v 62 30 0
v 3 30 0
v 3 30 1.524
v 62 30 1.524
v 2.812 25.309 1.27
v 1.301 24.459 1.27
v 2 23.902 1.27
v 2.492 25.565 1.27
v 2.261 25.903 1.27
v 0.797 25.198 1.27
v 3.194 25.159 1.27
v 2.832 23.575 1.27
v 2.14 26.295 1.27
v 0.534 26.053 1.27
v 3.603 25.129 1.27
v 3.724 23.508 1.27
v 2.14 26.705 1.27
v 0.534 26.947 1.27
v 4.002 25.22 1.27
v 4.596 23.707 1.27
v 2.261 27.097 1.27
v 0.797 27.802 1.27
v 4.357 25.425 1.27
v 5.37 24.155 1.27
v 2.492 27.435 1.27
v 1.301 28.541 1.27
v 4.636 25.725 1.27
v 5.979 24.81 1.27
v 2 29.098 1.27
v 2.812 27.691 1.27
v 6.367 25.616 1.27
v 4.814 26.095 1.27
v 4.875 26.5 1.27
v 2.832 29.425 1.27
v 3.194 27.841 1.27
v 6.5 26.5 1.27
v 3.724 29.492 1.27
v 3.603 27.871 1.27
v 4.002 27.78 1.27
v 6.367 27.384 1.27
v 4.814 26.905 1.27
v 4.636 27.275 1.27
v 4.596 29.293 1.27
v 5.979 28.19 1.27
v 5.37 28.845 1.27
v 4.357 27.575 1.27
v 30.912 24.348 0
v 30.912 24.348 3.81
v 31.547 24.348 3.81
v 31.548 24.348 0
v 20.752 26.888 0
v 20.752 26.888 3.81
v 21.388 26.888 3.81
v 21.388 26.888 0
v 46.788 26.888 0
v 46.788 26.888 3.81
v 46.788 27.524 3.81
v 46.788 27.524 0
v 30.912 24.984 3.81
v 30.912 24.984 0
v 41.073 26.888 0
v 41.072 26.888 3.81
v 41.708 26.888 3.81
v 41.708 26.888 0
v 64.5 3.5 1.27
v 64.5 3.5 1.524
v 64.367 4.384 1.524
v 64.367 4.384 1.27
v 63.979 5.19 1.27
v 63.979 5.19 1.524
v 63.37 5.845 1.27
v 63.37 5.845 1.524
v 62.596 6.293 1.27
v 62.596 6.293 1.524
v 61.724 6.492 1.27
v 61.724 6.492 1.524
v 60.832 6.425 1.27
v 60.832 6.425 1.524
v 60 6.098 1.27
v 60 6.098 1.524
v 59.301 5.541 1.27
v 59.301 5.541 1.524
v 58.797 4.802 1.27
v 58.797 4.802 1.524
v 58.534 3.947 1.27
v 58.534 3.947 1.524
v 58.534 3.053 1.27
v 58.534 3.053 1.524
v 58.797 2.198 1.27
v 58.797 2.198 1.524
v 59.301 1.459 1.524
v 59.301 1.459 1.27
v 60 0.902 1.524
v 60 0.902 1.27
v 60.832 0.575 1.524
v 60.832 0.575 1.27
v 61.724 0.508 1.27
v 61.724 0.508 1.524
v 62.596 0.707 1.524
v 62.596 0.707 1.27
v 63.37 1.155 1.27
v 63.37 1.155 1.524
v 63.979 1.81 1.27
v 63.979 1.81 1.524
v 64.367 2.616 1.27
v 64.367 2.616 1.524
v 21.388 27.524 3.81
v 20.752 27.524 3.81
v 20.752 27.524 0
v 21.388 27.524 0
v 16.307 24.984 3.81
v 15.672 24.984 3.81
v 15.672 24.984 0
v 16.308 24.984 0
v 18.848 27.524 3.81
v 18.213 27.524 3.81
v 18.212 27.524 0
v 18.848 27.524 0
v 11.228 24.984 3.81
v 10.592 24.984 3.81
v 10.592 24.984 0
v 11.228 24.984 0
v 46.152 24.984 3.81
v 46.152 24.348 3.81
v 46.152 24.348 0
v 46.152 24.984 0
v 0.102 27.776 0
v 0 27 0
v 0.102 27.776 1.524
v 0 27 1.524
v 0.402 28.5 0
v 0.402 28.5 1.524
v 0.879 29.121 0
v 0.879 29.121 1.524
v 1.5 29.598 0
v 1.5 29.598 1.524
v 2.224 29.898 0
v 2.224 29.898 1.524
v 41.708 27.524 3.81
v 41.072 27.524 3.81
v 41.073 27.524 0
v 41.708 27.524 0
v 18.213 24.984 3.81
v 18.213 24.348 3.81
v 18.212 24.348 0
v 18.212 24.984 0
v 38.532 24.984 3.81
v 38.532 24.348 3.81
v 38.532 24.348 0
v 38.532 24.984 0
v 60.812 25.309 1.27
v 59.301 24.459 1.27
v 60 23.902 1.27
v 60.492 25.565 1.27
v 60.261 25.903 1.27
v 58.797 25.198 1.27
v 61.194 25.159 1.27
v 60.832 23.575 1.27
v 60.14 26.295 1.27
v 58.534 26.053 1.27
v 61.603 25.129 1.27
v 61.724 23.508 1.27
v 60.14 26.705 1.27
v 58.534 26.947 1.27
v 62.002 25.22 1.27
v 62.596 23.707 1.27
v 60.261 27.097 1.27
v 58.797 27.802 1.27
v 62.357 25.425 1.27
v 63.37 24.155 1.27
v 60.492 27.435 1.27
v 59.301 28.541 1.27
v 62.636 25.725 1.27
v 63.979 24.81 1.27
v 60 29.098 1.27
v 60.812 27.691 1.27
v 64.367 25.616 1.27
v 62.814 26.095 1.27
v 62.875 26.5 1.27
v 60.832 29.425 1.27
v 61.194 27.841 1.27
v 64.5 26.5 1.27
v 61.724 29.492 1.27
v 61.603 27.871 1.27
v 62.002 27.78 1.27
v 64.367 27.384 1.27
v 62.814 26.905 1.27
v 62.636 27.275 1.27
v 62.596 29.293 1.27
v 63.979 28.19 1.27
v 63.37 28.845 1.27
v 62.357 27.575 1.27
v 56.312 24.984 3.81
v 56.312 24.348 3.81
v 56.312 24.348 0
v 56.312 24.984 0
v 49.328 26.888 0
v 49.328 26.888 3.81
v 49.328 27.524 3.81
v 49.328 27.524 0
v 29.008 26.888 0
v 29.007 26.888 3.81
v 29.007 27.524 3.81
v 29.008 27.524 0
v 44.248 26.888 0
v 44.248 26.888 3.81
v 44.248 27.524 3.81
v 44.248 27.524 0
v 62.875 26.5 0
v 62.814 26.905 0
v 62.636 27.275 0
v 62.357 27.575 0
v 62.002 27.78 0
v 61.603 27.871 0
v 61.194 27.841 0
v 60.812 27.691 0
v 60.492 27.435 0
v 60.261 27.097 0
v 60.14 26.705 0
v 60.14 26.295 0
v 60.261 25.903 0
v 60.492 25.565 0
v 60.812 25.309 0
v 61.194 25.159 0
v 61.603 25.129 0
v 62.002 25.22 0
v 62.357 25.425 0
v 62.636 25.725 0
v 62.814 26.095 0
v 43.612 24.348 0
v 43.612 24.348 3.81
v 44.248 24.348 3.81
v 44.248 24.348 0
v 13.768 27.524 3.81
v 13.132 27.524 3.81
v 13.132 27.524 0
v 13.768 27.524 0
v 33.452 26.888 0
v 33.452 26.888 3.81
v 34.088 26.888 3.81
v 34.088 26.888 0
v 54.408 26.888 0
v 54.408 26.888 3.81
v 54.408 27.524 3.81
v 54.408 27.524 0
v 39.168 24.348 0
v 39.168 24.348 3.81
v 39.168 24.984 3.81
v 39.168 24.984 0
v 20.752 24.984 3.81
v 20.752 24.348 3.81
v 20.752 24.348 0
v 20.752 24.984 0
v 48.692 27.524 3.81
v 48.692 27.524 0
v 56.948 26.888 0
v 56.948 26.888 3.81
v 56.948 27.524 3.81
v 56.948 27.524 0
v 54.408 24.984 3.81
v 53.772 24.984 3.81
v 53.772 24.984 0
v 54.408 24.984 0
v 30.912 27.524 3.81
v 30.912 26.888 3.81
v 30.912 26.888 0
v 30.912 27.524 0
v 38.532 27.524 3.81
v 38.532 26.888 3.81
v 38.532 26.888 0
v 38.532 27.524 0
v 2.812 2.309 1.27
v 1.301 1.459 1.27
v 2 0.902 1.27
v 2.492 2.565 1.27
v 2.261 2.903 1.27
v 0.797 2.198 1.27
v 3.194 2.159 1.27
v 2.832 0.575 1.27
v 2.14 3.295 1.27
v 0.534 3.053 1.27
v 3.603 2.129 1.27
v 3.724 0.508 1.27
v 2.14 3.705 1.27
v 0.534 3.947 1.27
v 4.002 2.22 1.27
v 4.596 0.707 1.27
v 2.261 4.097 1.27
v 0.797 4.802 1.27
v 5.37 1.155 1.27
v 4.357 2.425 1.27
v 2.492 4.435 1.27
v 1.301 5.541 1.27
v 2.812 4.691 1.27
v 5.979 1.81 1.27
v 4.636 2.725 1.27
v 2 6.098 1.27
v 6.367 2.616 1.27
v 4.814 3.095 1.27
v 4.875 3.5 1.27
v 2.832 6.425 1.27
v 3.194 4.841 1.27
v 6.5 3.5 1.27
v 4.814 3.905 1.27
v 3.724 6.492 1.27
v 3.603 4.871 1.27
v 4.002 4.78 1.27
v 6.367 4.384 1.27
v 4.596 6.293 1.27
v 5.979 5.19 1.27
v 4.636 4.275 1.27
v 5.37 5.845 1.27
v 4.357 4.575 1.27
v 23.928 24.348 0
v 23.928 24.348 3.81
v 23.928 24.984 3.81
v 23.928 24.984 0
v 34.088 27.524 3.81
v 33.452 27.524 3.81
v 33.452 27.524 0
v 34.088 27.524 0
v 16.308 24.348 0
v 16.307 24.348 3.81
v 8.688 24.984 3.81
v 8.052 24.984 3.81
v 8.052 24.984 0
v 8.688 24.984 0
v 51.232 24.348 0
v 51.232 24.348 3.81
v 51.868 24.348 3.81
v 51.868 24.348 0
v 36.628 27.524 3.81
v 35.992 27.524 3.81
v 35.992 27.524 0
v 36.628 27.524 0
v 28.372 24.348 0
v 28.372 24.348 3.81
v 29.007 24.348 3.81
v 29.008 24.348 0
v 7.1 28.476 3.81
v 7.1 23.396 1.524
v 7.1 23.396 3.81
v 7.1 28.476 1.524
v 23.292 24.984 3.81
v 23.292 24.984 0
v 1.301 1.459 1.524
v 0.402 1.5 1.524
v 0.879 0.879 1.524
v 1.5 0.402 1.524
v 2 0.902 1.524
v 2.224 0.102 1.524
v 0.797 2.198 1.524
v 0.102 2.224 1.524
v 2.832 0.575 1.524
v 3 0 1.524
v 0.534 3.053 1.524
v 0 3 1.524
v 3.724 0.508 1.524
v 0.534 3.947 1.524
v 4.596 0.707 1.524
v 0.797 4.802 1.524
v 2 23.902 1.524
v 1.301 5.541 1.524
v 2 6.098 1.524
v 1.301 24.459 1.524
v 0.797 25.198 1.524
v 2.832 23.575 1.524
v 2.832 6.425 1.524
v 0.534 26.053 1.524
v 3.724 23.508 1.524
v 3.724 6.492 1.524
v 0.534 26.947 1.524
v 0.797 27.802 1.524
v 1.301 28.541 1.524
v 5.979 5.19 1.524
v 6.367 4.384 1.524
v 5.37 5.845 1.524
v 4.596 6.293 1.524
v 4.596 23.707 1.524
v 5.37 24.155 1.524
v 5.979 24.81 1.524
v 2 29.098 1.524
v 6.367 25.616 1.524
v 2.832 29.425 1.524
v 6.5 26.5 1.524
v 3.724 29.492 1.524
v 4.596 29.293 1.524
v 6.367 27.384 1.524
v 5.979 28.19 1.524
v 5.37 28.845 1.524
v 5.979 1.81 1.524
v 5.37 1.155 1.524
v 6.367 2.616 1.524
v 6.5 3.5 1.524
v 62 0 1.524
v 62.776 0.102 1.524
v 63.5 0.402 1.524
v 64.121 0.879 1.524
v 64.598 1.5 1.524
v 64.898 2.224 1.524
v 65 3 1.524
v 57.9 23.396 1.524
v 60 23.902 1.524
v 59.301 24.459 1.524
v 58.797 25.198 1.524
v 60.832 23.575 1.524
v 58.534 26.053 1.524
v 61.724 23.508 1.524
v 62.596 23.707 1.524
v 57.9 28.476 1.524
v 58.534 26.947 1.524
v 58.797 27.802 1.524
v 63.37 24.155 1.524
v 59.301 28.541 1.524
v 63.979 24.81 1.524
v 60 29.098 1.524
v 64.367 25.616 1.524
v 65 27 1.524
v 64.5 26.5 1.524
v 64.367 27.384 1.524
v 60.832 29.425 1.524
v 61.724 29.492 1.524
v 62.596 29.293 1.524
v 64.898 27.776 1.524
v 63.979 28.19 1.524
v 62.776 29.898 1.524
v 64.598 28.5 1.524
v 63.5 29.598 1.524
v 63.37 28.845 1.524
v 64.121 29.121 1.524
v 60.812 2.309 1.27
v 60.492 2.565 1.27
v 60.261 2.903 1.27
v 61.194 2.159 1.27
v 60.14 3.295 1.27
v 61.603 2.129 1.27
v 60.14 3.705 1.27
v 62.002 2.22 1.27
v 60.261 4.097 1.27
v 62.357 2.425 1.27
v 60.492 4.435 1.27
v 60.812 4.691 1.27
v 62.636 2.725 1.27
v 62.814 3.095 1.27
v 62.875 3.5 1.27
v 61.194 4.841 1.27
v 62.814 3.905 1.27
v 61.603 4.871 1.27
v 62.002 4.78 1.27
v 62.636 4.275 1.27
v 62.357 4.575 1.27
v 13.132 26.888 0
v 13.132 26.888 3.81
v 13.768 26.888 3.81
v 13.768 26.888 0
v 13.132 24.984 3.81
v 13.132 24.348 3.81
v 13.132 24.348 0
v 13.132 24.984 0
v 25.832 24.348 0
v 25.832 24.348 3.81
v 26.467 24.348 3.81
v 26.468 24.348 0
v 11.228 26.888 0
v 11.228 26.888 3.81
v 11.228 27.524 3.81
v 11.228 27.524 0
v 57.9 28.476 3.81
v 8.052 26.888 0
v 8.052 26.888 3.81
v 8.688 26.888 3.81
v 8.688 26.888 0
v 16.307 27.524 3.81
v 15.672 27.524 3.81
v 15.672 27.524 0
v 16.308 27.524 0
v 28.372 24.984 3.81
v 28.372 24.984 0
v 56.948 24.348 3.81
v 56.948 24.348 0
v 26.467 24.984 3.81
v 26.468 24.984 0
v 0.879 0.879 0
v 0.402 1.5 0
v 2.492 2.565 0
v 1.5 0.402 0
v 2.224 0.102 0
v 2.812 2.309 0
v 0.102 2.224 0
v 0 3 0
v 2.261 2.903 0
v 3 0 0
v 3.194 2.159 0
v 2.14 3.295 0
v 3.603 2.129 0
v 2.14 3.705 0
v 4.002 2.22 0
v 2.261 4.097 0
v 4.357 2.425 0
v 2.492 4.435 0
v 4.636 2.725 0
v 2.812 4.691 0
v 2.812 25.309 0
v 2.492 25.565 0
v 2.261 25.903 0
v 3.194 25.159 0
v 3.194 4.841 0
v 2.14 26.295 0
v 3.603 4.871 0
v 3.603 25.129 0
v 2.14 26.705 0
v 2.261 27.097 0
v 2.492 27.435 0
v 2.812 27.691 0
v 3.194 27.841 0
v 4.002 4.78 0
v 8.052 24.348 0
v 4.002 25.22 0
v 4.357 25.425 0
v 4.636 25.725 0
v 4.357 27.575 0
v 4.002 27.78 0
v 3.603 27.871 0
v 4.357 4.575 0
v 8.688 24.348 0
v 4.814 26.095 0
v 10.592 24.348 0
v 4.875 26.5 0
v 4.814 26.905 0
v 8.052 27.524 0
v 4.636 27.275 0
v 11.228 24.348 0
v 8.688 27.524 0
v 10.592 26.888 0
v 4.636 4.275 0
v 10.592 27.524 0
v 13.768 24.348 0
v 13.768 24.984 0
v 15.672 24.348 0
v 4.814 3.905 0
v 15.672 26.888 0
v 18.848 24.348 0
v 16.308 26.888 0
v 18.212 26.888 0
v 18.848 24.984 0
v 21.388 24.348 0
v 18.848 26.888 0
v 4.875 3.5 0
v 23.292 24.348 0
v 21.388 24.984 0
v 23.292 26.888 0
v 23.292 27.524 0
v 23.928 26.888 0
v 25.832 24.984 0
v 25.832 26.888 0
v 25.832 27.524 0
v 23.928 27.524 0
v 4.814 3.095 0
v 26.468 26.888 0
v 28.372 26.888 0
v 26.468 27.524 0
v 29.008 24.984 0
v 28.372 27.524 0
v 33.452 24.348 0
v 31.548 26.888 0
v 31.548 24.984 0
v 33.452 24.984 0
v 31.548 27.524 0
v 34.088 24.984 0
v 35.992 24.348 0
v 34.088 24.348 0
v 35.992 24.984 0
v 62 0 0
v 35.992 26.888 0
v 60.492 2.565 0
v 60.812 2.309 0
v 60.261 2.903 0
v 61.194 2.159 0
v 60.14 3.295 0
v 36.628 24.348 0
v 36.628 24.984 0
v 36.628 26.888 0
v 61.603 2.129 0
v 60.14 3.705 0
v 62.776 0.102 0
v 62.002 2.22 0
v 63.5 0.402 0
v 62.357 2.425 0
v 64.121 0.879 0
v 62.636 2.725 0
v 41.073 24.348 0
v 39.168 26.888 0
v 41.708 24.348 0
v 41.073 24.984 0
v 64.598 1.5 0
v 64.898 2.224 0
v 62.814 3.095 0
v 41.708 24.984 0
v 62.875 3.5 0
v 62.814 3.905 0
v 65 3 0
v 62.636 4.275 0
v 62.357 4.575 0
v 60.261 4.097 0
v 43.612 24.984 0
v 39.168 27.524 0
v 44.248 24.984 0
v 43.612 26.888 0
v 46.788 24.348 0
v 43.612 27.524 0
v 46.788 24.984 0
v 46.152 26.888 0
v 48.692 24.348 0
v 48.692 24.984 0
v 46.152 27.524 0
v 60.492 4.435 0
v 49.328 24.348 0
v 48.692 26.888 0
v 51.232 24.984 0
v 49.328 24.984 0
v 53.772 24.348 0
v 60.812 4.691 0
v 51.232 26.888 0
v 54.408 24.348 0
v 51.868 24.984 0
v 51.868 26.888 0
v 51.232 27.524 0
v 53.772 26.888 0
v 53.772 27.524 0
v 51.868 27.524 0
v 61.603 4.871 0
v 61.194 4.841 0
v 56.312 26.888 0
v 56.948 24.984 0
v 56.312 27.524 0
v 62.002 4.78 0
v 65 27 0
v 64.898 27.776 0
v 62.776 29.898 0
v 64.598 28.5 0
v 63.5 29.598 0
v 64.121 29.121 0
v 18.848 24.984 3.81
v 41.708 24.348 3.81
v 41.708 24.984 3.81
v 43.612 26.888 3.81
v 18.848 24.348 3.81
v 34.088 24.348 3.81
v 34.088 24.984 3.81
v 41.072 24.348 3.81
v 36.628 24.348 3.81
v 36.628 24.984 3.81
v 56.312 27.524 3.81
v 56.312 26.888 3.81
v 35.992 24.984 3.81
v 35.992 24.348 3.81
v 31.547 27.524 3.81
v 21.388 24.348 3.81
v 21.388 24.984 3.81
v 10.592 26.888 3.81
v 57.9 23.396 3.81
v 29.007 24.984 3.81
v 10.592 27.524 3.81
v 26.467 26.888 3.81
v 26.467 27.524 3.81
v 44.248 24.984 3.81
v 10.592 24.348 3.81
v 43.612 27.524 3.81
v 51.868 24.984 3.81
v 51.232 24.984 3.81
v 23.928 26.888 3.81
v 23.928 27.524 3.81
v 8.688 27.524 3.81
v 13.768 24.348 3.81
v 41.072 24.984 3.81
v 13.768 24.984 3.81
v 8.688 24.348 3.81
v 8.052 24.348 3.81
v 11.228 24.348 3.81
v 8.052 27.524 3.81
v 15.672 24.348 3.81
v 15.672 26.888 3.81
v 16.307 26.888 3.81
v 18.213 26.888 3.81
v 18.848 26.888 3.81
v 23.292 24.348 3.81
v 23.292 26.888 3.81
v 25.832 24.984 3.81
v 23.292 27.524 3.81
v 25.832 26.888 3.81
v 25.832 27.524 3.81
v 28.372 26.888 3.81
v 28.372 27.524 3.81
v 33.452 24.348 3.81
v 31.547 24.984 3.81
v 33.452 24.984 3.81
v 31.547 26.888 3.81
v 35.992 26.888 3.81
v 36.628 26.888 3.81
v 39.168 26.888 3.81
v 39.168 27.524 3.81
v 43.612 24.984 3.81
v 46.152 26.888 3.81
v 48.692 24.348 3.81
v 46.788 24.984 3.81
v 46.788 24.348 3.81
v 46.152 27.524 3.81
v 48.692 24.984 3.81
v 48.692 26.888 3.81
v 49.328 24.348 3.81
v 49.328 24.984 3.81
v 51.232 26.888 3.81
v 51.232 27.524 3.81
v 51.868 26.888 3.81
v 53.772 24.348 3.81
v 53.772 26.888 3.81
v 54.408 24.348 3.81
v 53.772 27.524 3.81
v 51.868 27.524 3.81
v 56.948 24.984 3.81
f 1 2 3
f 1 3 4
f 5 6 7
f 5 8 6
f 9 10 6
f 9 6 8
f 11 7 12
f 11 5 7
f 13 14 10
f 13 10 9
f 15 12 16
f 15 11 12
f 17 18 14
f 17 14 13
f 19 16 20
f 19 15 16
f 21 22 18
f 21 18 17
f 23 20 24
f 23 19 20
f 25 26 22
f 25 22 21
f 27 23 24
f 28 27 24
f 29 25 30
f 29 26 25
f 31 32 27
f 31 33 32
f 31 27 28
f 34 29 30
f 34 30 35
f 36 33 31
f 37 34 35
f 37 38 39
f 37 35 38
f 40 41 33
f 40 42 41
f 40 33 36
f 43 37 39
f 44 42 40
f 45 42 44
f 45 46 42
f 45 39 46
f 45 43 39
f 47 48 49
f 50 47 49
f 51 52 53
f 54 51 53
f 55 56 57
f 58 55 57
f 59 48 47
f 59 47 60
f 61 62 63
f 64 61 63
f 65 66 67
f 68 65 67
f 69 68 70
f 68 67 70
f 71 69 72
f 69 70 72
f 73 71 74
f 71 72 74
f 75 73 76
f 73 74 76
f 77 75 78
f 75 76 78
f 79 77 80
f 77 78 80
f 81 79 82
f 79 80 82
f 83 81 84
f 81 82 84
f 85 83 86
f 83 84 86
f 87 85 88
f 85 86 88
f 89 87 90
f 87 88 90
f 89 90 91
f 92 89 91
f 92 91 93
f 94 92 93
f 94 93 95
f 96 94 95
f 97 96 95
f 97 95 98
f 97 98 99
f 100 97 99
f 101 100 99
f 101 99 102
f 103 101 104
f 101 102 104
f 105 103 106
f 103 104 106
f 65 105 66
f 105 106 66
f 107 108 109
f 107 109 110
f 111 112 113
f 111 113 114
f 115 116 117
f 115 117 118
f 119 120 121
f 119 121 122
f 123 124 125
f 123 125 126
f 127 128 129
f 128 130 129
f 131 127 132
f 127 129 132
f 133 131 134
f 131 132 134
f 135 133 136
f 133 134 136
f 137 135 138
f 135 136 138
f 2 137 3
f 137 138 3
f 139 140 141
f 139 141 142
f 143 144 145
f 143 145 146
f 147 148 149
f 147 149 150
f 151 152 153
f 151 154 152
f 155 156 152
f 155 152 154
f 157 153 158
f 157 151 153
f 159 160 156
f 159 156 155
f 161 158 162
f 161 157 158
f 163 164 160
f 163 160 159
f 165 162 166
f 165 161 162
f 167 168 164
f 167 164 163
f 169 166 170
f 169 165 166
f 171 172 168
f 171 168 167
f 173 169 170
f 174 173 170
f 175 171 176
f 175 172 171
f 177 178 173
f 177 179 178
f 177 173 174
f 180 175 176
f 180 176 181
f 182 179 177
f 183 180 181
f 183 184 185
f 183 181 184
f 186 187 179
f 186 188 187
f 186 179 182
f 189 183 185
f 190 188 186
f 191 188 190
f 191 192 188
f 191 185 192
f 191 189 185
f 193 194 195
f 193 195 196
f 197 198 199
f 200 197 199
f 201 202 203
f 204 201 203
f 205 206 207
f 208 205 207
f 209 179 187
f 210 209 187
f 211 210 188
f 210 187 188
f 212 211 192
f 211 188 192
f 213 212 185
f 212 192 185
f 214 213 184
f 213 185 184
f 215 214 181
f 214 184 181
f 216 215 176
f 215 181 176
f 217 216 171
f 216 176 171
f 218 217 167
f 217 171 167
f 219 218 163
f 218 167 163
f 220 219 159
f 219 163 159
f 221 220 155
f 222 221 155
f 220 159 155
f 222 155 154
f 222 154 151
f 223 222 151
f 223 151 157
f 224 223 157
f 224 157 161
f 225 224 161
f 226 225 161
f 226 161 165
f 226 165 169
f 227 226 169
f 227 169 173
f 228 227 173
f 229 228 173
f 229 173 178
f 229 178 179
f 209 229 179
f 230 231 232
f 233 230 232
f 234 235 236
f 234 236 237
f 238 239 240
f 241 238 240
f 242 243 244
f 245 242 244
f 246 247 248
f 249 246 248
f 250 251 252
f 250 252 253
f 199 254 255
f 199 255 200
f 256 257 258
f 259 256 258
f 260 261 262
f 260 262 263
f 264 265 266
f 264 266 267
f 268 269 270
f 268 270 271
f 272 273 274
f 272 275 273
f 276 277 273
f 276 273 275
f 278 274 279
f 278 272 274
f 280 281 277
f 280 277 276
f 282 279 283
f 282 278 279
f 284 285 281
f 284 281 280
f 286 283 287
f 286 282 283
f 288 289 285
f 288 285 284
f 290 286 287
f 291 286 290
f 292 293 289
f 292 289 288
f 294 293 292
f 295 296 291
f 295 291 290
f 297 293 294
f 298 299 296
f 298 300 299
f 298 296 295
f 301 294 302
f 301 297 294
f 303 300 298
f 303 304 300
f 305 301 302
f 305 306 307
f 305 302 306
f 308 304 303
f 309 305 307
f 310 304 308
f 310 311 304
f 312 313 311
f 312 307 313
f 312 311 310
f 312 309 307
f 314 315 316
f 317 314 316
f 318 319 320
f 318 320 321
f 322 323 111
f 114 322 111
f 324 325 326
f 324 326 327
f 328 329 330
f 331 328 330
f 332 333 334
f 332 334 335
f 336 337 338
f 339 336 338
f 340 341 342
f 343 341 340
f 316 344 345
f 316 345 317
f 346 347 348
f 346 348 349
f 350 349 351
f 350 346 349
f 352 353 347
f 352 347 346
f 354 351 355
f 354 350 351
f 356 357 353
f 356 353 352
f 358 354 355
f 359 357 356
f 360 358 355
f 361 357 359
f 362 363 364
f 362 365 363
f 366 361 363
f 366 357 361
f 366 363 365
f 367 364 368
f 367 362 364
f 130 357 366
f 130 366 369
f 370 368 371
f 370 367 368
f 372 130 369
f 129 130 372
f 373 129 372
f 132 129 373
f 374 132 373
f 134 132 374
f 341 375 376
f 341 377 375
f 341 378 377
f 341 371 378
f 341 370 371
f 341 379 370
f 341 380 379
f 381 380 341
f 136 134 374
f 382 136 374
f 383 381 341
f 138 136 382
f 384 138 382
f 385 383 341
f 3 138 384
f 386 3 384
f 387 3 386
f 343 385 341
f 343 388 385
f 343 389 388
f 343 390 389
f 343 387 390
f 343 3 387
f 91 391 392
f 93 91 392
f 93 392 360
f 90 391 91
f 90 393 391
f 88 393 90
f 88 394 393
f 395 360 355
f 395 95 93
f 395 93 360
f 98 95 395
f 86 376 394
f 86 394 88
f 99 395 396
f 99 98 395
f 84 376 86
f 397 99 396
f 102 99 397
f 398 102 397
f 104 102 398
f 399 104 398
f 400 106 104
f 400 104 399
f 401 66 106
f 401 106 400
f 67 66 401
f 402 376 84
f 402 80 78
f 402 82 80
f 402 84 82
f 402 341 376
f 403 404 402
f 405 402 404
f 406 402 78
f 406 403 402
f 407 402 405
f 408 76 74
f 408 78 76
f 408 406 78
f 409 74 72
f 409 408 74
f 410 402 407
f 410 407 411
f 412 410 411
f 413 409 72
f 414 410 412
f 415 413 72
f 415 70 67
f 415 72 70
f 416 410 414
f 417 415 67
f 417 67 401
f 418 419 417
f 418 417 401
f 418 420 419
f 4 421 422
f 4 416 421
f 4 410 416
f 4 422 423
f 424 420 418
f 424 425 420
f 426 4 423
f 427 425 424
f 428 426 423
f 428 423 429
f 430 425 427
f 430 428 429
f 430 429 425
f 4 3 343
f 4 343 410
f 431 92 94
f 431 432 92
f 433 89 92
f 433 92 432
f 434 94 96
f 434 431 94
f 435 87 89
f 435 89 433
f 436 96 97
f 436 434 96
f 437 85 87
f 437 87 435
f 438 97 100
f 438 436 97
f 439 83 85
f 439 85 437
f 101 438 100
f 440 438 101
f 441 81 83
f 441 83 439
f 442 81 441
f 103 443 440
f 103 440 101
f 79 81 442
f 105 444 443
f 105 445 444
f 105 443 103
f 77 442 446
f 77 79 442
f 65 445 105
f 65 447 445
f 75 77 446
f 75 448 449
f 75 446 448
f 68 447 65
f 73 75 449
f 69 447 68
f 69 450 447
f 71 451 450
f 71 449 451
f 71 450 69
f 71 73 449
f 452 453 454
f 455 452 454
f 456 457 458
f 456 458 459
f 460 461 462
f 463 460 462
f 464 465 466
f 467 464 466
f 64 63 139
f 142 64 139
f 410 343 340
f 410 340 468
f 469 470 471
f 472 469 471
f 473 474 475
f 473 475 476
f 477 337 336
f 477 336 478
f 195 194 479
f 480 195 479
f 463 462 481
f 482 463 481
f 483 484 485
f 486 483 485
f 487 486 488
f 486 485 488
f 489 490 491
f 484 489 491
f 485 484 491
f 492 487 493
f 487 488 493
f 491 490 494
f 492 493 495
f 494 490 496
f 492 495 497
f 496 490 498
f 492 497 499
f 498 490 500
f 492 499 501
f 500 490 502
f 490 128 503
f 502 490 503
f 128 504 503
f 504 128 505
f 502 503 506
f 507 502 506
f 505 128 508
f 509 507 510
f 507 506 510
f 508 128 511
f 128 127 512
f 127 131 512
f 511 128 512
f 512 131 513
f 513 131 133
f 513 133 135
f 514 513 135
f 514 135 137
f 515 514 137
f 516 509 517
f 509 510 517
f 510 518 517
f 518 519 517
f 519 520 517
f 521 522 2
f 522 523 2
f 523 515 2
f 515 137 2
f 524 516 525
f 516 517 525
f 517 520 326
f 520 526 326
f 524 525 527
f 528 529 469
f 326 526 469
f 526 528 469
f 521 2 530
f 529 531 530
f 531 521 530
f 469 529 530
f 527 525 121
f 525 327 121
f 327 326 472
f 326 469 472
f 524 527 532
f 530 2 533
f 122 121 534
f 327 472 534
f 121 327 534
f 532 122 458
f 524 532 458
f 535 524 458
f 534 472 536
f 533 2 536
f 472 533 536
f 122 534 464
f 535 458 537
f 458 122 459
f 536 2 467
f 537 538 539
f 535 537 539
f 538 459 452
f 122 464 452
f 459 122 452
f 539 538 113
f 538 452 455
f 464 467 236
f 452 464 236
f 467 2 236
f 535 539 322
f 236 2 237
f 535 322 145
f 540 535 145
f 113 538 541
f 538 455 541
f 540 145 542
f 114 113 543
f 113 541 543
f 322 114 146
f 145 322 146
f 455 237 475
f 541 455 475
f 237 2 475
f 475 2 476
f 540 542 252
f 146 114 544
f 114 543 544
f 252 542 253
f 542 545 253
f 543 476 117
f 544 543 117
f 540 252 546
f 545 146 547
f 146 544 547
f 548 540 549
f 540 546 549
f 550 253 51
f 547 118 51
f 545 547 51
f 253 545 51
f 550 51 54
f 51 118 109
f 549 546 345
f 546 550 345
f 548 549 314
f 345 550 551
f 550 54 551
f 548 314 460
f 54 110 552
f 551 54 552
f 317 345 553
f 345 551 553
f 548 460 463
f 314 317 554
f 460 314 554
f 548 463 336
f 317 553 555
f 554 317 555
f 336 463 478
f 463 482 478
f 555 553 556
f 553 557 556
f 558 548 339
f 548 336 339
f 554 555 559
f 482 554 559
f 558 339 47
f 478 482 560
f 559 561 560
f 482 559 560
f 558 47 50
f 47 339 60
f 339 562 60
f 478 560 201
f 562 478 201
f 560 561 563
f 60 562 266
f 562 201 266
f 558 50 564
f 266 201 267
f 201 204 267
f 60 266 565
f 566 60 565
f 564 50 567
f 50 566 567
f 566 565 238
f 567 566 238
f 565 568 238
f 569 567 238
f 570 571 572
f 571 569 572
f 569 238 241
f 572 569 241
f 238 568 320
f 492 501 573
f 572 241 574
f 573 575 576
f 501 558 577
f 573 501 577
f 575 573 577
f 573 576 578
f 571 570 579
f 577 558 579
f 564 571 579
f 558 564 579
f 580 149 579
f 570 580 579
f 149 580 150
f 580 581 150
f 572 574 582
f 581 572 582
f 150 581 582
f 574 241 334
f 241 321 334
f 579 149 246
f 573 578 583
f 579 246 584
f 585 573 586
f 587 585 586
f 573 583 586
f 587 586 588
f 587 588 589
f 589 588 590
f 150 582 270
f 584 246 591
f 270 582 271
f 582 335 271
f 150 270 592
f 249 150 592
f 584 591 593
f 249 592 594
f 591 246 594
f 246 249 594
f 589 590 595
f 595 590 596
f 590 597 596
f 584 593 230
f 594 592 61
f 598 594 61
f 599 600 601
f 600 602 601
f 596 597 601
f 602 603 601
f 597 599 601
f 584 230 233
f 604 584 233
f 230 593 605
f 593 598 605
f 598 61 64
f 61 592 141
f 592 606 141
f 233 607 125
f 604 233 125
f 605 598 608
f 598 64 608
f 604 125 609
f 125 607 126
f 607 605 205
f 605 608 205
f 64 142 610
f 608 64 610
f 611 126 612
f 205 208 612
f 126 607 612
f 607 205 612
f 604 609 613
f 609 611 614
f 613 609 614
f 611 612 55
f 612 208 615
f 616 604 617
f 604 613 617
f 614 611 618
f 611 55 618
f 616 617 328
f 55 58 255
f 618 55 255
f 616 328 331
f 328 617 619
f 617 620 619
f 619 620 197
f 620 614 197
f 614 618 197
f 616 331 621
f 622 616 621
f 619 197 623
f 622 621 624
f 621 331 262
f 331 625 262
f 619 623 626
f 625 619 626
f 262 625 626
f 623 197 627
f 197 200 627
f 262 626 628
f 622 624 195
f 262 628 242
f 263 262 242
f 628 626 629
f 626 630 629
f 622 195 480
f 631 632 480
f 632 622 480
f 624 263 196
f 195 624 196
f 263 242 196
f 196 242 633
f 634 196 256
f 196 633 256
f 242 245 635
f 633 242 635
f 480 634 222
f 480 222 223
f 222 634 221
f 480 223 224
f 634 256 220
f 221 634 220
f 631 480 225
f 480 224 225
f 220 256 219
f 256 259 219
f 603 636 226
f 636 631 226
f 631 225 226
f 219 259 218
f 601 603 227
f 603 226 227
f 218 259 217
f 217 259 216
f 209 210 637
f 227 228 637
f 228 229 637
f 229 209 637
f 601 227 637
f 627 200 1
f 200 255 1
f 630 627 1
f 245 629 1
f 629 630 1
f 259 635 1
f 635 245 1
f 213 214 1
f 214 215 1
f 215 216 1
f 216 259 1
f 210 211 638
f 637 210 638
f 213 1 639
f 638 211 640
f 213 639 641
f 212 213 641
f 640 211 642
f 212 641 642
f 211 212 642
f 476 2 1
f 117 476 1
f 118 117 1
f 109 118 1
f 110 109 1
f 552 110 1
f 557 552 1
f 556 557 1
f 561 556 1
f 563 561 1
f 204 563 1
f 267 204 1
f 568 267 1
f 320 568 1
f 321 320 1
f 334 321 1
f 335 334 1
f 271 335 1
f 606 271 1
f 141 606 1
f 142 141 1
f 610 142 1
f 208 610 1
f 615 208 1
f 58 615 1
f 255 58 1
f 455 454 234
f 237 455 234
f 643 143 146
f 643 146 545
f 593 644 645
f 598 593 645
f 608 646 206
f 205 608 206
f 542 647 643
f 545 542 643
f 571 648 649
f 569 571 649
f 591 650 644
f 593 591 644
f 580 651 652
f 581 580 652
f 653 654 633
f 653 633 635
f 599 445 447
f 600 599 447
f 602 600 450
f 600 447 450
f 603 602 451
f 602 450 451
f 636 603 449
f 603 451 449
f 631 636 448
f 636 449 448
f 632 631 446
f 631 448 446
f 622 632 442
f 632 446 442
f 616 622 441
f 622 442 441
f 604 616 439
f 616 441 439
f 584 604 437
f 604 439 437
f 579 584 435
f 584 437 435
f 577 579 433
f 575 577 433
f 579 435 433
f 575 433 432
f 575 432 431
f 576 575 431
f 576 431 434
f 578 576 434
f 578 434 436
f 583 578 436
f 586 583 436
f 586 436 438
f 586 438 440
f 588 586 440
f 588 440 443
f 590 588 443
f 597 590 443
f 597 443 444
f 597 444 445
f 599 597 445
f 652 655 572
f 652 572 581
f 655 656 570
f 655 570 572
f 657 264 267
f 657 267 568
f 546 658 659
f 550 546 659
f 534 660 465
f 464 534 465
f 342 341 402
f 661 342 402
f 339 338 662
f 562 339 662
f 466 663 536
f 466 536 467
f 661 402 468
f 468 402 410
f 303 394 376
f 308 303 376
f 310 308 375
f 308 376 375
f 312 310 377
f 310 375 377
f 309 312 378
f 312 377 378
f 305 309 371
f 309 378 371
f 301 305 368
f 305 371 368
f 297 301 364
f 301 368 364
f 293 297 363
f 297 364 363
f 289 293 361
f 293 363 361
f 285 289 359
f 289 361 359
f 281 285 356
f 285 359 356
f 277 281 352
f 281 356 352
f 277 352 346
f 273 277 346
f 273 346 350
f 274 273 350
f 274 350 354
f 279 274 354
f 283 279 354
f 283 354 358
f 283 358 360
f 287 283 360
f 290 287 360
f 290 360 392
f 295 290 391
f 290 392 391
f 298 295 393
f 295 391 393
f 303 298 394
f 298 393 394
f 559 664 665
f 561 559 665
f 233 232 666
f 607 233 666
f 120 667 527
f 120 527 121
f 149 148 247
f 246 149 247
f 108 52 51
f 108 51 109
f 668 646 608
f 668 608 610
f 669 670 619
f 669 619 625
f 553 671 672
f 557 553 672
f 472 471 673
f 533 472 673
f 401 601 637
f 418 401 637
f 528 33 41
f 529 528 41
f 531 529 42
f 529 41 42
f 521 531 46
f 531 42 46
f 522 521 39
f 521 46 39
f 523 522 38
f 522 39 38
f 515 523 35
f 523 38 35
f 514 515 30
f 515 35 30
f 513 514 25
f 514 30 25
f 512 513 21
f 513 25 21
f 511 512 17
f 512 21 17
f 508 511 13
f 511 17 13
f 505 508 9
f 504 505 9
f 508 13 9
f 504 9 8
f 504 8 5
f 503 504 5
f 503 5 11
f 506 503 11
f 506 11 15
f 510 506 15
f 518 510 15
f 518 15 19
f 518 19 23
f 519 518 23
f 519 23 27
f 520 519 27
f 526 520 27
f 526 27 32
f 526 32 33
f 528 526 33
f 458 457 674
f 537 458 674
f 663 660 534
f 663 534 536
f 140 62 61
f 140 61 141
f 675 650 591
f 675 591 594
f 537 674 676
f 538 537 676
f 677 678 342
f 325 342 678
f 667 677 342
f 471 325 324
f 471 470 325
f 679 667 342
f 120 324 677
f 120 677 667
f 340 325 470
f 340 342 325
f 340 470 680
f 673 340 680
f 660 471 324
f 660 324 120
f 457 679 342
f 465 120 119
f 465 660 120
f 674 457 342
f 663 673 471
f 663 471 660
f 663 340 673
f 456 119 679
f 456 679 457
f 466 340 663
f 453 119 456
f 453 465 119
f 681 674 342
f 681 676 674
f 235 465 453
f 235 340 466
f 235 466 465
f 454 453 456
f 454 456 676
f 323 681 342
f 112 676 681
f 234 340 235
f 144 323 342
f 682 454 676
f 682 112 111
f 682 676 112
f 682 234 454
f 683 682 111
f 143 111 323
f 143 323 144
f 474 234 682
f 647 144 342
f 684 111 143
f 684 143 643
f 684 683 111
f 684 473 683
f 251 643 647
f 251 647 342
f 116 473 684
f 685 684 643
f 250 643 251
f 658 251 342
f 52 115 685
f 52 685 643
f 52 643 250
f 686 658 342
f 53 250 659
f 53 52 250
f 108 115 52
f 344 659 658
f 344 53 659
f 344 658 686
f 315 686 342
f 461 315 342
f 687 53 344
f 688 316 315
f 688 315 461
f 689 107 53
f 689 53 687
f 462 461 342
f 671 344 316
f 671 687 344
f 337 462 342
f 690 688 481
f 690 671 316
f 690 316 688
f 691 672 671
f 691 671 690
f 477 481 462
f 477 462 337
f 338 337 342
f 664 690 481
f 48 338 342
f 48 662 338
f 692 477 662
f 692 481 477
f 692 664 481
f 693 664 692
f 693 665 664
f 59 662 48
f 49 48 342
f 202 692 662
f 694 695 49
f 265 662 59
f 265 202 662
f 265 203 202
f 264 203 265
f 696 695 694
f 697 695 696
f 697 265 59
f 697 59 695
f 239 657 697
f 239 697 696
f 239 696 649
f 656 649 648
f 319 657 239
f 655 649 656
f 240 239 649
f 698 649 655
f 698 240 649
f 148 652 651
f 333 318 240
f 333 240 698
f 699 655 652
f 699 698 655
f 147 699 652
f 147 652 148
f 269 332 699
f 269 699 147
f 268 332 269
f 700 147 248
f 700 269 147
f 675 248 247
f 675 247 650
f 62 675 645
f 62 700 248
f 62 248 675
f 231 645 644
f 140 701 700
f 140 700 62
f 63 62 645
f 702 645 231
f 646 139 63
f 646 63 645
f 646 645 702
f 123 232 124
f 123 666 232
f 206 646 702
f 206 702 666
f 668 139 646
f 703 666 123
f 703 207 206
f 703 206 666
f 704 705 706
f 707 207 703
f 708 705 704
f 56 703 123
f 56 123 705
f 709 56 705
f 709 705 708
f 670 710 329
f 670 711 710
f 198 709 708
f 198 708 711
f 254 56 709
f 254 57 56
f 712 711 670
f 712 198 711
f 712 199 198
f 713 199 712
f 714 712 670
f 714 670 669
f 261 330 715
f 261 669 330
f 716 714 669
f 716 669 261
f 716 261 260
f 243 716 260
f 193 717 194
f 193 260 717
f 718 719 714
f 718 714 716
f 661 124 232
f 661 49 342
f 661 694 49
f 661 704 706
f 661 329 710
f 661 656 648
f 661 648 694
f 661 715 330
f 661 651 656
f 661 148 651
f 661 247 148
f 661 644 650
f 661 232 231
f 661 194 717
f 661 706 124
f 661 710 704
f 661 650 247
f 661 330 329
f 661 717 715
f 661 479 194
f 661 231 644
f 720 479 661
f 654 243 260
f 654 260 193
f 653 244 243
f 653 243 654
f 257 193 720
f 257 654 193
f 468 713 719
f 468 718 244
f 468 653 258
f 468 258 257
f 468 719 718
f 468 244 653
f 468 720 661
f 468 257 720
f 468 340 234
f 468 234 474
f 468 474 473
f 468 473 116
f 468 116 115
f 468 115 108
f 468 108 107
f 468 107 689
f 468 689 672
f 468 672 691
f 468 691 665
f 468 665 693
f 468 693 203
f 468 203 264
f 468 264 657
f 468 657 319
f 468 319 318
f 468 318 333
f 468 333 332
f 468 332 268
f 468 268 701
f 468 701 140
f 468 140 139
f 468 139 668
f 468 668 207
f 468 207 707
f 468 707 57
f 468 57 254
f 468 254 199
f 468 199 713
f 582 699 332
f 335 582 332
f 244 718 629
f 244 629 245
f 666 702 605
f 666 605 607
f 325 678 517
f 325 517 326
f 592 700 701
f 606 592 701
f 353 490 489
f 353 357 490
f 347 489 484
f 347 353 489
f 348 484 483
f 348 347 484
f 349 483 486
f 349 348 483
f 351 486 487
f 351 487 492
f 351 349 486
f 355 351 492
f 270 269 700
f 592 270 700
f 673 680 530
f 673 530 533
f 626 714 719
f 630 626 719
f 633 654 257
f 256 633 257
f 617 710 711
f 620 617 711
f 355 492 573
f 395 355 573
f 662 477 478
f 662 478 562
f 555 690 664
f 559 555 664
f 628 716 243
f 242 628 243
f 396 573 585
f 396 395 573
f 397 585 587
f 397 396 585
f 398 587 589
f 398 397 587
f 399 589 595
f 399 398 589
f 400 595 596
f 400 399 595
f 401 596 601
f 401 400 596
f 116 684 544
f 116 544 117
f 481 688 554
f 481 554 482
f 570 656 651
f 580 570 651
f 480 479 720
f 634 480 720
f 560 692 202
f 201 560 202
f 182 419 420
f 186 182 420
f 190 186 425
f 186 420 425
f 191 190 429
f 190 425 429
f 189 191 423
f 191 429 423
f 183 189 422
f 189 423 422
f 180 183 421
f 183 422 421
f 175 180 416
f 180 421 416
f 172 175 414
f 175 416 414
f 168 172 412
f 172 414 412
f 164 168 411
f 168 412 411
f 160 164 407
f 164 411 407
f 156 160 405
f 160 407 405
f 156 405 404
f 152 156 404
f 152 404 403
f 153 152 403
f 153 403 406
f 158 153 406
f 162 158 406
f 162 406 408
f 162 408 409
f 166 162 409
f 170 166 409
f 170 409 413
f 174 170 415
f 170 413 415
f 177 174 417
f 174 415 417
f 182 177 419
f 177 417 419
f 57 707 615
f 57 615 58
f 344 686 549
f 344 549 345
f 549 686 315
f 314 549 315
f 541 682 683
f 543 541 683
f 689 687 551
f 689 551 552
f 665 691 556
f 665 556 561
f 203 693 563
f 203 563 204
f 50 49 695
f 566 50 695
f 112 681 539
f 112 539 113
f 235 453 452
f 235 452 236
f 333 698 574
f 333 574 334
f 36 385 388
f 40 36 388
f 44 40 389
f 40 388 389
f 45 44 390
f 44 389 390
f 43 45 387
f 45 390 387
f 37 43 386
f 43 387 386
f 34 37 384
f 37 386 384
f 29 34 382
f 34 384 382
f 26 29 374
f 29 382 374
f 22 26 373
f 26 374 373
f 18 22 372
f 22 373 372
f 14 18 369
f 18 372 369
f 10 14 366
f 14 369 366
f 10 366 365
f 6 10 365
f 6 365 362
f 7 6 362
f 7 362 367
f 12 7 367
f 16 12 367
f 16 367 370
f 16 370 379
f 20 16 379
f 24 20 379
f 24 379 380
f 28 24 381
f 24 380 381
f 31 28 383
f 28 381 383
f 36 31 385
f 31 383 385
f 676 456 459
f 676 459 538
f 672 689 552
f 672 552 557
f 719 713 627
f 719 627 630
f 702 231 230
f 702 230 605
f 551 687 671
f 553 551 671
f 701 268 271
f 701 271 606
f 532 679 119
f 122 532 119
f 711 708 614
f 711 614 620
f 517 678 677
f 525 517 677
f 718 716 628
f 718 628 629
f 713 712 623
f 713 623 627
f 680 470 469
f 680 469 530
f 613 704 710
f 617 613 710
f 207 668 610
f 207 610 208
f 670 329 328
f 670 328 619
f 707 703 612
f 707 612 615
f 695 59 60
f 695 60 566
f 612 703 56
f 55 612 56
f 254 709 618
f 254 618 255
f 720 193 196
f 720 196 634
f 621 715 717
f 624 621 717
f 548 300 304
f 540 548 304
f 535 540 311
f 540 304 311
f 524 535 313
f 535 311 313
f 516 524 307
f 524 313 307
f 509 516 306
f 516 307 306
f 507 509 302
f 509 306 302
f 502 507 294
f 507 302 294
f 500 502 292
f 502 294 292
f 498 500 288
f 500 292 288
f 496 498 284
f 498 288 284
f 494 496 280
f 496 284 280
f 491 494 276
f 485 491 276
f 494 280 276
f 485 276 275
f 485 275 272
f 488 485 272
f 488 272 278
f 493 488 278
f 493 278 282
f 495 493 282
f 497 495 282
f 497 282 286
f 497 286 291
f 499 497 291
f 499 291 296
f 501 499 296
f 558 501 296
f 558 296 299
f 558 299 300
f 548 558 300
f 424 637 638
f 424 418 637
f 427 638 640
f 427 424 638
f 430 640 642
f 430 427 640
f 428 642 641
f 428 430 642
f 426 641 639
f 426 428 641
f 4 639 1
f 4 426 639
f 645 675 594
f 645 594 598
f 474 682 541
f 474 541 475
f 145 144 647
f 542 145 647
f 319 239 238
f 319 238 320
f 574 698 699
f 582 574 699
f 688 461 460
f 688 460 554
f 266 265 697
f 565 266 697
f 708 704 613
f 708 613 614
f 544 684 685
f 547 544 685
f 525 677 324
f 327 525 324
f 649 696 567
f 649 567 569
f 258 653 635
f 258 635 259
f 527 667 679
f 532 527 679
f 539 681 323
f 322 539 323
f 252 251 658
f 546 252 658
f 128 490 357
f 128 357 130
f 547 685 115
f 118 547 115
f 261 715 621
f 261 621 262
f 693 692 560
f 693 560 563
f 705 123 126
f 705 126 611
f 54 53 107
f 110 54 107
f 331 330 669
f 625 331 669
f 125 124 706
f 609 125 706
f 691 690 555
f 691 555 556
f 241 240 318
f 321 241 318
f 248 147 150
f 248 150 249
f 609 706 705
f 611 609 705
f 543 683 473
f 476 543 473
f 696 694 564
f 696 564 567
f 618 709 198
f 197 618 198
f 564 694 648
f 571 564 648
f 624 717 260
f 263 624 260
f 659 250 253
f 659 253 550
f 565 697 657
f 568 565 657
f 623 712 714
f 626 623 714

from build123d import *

# Parameters (mm, degrees)
SKETCH1_W           = 65
SKETCH1_H           = 30
BOSS_EXTRUDE1_DEPTH = 1.524
FILLET1_R           = 3
SKETCH2_R           = 1.375
CUT_EXTRUDE1_DEPTH  = 72.605325053
SKETCH3_R           = 3
CUT_EXTRUDE2_DEPTH  = 0.254
SKETCH8_W           = 50.8
SKETCH8_H           = 5.08
BOSS_EXTRUDE8_DEPTH = 2.286
SKETCH9_W           = 0.635
SKETCH9_H           = 0.635
CUT_EXTRUDE3_DEPTH  = 72.690418467
LPATTERN1_COUNT     = 20
LPATTERN1_PITCH     = 2.54


with BuildPart() as part:
    # Sketch1 → Boss-Extrude1 (new body)
    with BuildSketch(Plane.XY):
        with Locations((32.5, 15)):
            Rectangle(SKETCH1_W, SKETCH1_H)
    extrude(amount=BOSS_EXTRUDE1_DEPTH)

    # Fillet1
    fillet1_edges = [part.edges().sort_by_distance(p)[0] for p in [
        (0, 30, 0.762),
        (65, 30, 0.762),
        (65, 0, 0.762),
        (0, 0, 0.762),
    ]]
    fillet(fillet1_edges, radius=FILLET1_R)

    # Sketch2 → Cut-Extrude1 (cut, through all)
    with BuildSketch(Plane.XY.offset(1.524)):
        with Locations((3.5, 26.5)):
            Circle(SKETCH2_R)
        with Locations((61.5, 26.5)):
            Circle(SKETCH2_R)
        with Locations((61.5, 3.5)):
            Circle(SKETCH2_R)
        with Locations((3.5, 3.5)):
            Circle(SKETCH2_R)
    extrude(amount=-CUT_EXTRUDE1_DEPTH, mode=Mode.SUBTRACT)

    # Sketch3 → Cut-Extrude2 (cut)
    with BuildSketch(Plane.XY.offset(1.524)):
        with Locations((3.5, 26.5)):
            Circle(SKETCH3_R)
        with Locations((61.5, 26.5)):
            Circle(SKETCH3_R)
        with Locations((61.5, 3.5)):
            Circle(SKETCH3_R)
        with Locations((3.5, 3.5)):
            Circle(SKETCH3_R)
    extrude(amount=-CUT_EXTRUDE2_DEPTH, mode=Mode.SUBTRACT)

    # Sketch8 → Boss-Extrude8 (add)
    with BuildSketch(Plane.XY.offset(1.524)):
        with Locations((32.5, 25.936)):
            Rectangle(SKETCH8_W, SKETCH8_H)
    extrude(amount=BOSS_EXTRUDE8_DEPTH)

    # Sketch9 → Cut-Extrude3 (cut, through all)
    with BuildSketch(Plane.XY.offset(3.81)):
        with Locations((8.37, 27.206)):
            Rectangle(SKETCH9_W, SKETCH9_H)
        with Locations((8.37, 24.666)):
            Rectangle(SKETCH9_W, SKETCH9_H)
    cut_extrude3 = extrude(amount=-CUT_EXTRUDE3_DEPTH, mode=Mode.SUBTRACT)

    # LPattern1: Cut-Extrude3 ×20
    with Locations(*[(i * LPATTERN1_PITCH, 0, 0) for i in range(1, LPATTERN1_COUNT)]):
        add(cut_extrude3, mode=Mode.SUBTRACT)


solid = part.part
